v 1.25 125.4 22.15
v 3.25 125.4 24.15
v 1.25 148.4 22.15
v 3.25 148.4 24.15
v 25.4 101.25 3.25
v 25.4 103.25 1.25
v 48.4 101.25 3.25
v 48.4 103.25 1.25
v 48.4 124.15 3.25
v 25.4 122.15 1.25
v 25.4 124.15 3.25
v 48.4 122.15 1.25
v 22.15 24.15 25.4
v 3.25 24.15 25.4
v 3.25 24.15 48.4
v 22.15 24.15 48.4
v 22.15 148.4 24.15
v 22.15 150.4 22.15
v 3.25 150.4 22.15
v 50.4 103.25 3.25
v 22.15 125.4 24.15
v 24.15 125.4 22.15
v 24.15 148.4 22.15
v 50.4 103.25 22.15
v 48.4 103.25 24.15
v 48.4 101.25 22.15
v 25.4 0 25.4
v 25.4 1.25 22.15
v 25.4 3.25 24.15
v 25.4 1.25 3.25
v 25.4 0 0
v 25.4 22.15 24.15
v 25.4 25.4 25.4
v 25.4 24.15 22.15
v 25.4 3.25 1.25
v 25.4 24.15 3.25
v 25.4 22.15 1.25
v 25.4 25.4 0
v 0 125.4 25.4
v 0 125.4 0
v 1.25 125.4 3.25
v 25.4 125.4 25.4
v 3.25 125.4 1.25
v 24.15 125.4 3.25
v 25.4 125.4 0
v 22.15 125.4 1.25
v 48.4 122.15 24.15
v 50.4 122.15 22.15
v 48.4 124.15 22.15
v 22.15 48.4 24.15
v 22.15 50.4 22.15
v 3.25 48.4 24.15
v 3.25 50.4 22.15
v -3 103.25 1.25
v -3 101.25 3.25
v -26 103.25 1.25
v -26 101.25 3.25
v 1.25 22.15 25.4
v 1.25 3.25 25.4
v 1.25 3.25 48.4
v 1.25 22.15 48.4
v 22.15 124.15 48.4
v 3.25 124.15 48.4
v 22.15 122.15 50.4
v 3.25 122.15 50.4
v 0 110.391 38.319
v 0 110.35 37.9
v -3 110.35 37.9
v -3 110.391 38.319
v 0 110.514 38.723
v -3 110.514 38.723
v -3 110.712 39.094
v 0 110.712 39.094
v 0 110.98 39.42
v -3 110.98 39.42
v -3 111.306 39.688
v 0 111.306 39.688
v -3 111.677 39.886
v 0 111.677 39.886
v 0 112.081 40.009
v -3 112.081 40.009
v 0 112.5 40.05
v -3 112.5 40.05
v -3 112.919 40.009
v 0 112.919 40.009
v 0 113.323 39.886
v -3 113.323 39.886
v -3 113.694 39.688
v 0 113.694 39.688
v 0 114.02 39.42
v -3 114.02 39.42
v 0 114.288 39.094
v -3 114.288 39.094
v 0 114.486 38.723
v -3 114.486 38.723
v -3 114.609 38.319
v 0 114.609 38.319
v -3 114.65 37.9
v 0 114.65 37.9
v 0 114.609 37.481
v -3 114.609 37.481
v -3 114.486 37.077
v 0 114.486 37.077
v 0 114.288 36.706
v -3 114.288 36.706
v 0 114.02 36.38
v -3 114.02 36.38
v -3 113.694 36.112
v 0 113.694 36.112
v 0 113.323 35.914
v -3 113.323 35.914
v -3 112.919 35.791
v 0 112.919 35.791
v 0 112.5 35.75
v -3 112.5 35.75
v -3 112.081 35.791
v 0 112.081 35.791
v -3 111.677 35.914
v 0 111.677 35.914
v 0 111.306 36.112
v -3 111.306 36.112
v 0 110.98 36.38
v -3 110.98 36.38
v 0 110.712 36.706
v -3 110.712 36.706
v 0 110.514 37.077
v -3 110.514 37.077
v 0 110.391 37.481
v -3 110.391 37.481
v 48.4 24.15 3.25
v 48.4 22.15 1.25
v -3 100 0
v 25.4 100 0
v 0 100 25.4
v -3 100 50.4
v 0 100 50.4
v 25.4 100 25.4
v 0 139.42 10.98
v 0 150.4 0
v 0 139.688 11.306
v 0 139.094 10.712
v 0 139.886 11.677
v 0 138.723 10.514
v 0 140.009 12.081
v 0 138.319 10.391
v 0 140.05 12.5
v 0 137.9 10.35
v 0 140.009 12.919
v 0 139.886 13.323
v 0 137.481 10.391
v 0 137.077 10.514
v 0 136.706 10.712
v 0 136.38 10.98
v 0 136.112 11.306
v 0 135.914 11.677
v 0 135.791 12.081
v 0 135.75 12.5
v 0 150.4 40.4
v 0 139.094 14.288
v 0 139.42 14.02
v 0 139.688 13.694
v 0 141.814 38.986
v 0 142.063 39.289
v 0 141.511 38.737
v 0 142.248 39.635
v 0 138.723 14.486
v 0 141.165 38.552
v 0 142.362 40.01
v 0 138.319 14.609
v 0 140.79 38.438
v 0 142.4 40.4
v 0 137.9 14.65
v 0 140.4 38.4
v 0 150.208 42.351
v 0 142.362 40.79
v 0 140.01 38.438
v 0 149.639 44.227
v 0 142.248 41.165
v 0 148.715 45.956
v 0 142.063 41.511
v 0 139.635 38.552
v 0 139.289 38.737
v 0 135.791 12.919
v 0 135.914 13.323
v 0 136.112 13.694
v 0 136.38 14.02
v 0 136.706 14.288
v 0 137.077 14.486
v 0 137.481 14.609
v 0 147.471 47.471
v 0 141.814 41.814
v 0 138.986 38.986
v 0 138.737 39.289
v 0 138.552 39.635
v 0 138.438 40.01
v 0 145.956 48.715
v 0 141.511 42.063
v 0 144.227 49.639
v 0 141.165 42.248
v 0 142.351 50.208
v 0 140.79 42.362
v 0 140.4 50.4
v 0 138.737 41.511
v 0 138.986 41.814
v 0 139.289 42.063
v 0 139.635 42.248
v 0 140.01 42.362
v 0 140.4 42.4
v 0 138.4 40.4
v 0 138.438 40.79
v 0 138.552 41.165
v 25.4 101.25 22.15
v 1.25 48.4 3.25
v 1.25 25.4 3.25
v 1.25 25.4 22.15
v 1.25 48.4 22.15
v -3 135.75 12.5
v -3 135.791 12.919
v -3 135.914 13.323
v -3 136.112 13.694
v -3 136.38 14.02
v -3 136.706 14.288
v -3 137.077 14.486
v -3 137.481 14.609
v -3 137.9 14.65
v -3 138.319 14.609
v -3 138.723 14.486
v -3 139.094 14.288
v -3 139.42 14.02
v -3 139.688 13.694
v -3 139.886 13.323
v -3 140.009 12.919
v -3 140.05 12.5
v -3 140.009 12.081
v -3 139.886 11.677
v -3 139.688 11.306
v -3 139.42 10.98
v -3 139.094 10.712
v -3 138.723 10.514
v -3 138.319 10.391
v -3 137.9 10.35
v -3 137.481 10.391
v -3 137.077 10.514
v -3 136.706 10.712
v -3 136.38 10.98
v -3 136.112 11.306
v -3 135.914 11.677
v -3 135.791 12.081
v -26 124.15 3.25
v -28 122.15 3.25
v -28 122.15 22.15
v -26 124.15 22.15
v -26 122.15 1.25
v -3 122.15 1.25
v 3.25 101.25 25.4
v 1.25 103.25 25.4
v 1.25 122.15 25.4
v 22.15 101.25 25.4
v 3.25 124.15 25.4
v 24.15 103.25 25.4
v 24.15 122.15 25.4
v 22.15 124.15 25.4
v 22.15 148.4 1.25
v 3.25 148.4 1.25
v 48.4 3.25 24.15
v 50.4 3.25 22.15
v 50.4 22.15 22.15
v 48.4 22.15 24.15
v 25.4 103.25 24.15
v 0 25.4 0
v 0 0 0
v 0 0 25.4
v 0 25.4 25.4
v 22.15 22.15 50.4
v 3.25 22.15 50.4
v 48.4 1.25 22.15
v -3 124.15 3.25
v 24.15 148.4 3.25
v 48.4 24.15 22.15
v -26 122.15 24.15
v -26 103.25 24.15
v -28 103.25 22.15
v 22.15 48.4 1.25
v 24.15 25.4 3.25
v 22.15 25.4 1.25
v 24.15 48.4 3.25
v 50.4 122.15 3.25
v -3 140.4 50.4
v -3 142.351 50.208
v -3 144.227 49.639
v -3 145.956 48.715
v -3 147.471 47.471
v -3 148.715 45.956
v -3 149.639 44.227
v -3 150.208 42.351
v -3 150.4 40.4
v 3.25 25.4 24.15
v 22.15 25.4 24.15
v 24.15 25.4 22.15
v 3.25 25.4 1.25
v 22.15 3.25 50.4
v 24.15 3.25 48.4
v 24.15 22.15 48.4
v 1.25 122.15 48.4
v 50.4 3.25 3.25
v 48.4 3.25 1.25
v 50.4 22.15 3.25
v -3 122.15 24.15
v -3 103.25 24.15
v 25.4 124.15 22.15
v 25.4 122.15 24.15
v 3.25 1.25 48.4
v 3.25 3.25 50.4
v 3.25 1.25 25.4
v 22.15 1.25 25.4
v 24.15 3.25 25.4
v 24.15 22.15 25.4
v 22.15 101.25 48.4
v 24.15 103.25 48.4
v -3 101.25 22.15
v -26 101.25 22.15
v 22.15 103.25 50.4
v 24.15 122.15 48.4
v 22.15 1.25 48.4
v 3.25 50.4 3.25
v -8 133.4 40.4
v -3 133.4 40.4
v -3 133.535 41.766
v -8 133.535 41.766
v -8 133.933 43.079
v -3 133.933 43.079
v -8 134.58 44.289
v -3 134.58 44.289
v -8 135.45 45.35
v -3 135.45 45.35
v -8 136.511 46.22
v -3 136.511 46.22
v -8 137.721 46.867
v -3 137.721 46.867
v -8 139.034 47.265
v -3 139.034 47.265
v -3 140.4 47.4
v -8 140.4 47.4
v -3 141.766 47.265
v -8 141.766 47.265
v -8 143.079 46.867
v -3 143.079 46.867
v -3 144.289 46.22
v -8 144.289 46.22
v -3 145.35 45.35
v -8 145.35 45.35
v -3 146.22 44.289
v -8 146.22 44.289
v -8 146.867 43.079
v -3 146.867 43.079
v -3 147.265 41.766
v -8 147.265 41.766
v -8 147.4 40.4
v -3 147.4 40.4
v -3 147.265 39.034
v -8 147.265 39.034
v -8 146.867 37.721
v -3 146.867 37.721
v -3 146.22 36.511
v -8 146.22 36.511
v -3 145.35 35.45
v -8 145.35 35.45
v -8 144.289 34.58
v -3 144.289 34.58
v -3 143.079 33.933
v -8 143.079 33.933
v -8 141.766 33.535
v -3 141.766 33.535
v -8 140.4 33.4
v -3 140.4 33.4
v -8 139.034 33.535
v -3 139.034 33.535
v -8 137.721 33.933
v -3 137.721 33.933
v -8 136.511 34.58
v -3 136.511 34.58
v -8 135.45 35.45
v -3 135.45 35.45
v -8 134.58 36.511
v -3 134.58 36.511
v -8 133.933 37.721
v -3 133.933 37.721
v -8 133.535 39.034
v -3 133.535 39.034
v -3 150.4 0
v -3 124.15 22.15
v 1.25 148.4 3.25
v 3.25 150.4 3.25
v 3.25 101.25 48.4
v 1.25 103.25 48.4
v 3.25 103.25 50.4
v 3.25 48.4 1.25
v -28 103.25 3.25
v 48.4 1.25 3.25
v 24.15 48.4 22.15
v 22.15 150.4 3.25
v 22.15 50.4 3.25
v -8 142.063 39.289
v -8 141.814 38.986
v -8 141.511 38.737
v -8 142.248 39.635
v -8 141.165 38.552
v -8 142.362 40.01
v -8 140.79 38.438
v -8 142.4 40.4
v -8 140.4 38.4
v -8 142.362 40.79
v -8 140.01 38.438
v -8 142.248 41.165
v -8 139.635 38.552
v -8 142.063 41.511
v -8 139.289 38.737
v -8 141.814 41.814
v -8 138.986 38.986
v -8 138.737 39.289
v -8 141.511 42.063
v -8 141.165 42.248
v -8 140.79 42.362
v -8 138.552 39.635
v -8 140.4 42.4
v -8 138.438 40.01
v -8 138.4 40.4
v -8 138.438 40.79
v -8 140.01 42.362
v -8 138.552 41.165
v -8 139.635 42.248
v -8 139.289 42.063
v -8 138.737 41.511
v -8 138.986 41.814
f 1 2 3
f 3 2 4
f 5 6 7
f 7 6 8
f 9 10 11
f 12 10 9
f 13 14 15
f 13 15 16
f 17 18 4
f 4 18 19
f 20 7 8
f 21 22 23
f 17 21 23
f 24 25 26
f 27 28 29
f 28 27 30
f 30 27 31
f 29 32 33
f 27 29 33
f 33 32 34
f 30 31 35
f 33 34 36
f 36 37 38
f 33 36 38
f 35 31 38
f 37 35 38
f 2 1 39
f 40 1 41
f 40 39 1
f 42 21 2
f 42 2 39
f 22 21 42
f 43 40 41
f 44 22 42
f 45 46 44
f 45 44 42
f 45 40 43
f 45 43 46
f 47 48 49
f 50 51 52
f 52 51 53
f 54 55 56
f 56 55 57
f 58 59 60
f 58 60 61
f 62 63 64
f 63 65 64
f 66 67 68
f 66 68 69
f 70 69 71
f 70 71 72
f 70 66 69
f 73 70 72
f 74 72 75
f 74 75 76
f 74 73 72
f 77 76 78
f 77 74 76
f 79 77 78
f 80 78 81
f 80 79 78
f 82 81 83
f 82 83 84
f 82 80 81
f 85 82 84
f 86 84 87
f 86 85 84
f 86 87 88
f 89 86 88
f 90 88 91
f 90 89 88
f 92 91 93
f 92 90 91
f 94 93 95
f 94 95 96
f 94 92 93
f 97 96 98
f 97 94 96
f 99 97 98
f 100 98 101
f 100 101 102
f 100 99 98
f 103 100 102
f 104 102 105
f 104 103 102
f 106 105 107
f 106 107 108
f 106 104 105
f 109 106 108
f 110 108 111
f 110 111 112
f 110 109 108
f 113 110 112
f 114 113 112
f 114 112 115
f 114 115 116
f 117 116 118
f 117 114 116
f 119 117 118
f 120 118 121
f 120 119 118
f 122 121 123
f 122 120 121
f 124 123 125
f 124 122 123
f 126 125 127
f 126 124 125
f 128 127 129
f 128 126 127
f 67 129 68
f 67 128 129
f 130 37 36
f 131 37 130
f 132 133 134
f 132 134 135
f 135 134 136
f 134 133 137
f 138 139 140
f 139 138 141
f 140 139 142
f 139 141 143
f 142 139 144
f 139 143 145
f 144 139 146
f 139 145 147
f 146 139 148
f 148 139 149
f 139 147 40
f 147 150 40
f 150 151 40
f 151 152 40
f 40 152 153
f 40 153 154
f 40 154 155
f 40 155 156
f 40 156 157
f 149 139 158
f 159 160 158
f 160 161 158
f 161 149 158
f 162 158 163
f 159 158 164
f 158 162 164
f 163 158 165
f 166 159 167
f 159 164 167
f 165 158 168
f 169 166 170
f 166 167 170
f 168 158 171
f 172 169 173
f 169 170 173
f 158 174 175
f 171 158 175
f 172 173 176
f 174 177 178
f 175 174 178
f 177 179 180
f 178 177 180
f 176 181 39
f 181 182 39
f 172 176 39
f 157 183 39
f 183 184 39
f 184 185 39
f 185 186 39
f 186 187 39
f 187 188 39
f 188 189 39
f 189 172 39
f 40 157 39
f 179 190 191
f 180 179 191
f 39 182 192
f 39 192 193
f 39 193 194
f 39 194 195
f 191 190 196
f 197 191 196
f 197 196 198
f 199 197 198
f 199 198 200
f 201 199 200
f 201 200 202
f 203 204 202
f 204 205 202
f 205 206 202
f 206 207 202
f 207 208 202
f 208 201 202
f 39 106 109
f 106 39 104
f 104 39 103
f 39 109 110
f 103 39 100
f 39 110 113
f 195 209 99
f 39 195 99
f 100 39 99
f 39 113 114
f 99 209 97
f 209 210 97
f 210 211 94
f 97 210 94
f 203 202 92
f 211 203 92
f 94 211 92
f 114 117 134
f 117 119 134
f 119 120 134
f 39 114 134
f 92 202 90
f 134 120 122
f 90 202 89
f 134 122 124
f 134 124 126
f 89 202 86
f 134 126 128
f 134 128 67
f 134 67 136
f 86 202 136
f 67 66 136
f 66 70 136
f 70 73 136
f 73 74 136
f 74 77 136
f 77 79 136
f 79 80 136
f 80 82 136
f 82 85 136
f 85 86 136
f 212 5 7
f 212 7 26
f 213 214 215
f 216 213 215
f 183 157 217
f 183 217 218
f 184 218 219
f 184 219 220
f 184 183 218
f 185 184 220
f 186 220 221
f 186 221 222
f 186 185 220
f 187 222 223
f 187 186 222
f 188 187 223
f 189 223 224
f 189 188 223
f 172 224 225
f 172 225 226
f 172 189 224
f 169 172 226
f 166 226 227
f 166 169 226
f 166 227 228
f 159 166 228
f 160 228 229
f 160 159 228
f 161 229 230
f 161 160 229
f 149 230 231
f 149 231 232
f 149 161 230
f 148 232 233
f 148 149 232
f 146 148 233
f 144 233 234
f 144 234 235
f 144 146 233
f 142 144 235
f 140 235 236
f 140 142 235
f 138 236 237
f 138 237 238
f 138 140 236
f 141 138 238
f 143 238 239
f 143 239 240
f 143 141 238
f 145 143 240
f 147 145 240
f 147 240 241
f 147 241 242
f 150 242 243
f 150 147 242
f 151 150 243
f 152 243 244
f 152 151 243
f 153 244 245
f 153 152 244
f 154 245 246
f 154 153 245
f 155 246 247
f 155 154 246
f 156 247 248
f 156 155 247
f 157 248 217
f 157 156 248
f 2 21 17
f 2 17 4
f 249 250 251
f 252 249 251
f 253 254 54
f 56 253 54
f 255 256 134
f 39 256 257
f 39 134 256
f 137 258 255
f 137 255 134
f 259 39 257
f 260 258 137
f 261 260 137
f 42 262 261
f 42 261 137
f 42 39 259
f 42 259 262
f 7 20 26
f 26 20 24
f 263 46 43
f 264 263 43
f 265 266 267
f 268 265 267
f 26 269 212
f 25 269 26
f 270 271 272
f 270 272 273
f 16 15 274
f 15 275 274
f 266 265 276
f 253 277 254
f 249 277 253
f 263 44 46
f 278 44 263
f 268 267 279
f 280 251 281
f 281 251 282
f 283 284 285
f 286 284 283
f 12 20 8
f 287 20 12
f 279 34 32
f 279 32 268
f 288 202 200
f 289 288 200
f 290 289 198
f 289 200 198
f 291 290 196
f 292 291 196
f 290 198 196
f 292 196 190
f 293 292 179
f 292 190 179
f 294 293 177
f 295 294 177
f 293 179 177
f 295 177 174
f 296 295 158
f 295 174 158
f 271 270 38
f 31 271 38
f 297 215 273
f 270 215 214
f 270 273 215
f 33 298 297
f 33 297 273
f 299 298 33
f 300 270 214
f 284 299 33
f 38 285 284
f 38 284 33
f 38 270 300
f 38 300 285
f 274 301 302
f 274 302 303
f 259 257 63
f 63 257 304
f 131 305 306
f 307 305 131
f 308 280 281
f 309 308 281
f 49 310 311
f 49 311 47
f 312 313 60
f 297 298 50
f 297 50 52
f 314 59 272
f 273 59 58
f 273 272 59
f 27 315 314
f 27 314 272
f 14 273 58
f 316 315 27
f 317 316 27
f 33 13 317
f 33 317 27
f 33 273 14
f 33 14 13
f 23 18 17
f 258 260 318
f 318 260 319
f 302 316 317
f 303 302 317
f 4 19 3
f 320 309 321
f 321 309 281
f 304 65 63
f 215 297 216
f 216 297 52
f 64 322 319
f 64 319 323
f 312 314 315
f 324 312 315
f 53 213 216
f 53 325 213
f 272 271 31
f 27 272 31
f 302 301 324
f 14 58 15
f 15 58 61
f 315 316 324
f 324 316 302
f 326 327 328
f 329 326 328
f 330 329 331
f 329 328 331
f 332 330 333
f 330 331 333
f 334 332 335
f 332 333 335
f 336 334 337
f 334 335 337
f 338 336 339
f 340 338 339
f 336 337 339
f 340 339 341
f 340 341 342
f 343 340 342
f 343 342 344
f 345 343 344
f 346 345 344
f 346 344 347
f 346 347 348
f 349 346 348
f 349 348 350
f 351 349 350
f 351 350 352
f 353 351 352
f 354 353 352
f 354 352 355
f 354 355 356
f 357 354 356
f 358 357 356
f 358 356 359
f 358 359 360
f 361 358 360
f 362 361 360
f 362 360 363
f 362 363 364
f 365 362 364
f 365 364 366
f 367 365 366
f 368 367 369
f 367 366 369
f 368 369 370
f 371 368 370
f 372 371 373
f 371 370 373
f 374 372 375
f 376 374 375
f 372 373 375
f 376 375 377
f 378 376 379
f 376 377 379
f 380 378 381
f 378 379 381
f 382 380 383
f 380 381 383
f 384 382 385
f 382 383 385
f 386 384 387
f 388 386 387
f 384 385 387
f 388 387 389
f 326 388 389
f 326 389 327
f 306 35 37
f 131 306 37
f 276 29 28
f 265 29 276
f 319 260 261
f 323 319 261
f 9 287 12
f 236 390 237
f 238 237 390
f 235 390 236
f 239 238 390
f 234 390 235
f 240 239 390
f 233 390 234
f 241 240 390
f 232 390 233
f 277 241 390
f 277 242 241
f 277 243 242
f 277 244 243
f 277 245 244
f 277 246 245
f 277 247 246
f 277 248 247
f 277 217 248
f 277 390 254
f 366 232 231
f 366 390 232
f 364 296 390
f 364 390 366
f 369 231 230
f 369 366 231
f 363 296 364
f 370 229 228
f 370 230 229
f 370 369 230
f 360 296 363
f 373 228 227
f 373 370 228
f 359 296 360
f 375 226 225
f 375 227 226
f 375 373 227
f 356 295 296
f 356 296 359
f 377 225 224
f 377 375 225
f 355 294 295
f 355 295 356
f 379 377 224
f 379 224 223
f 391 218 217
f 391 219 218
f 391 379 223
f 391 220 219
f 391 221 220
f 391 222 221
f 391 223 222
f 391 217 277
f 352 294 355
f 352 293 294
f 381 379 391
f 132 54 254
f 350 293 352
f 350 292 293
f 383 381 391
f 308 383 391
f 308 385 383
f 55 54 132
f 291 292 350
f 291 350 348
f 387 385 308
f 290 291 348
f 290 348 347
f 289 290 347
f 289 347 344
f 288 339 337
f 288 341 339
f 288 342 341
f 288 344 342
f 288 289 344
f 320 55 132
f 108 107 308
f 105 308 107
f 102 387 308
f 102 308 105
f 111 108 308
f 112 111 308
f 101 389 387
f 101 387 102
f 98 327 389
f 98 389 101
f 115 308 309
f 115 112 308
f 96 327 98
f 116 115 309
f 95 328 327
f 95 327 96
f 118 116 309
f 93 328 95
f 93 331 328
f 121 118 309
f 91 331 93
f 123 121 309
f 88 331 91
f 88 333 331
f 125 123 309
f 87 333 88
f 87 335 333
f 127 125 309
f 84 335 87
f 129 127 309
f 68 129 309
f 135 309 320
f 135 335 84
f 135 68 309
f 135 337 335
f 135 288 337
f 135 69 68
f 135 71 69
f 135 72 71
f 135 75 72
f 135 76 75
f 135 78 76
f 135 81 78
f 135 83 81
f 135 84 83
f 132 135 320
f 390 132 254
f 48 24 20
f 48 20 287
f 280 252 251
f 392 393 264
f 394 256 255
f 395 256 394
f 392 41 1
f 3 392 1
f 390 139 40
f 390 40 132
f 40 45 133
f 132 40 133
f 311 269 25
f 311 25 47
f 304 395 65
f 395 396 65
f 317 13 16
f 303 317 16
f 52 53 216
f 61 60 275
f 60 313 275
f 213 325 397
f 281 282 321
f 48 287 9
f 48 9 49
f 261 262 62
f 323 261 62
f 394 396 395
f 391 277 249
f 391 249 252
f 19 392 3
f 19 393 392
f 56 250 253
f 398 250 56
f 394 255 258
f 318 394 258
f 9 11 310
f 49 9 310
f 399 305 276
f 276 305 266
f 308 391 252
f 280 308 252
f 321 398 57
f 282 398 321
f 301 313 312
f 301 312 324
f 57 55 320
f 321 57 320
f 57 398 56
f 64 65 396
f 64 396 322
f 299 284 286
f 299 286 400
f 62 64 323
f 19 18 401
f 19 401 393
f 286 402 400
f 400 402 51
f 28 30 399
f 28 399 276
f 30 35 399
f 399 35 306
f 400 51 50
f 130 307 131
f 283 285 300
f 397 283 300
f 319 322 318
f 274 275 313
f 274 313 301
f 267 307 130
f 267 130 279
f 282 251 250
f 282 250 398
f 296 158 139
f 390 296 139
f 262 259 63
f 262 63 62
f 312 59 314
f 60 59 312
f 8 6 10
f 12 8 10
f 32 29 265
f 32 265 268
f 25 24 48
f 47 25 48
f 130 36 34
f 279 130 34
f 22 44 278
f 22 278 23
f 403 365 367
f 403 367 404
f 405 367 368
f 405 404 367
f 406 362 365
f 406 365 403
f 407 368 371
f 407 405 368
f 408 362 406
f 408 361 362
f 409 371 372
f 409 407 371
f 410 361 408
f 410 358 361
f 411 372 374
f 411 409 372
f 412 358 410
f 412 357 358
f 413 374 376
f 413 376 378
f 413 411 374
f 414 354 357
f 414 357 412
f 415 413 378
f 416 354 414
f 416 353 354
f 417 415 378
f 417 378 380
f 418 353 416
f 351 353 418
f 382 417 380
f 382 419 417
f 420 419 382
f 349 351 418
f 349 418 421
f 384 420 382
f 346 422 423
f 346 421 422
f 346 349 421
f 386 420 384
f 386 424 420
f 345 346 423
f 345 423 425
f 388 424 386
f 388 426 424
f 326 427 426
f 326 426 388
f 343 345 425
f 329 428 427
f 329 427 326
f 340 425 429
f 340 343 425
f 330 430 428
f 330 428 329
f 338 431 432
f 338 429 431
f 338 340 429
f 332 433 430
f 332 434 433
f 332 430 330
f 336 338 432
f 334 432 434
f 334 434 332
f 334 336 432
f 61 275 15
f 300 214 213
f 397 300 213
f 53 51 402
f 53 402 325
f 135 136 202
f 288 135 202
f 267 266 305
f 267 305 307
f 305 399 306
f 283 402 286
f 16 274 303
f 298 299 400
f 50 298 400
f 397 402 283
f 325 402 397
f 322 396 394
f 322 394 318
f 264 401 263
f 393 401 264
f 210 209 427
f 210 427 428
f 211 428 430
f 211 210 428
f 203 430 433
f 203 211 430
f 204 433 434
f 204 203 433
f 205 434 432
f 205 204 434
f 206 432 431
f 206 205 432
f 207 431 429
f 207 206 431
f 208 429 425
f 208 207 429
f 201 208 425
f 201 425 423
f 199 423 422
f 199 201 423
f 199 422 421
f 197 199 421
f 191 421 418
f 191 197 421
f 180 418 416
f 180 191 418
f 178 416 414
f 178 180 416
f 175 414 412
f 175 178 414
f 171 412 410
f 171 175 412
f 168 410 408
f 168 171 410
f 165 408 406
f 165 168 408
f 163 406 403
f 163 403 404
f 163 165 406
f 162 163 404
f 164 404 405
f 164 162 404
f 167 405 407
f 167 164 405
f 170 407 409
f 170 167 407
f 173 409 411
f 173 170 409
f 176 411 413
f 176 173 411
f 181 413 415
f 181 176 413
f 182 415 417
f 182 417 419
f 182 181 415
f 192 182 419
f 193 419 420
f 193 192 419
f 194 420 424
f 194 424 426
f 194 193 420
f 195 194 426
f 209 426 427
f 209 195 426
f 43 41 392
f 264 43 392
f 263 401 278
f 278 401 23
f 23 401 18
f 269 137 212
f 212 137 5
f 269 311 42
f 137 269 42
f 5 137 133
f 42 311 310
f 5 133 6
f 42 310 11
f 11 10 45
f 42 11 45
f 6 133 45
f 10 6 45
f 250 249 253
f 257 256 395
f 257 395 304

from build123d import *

# Parameters (mm, degrees)
F0_W      = 25.4
F0_H      = 25.4
F1_DEPTH  = 25.4
F2_W      = 22.9
F2_H      = 22.9
F3_DEPTH  = 25
F4_W      = 22.9
F4_H      = 22.9
F5_DEPTH  = 25
F6_W      = 22.9
F6_H      = 22.9
F7_DEPTH  = 25
F8_SIZE   = 2
F12_W     = 25.4
F12_H     = 25.4
F12_R     = 2.15
F12_R_2   = 7
F13_DEPTH = 3
F12_R_3   = 2
F14_DEPTH = 8
F15_W     = 22.9
F15_H     = 22.9
F16_DEPTH = 25
F17_SIZE  = 2


with BuildPart() as f1:
    # F0 (on Top) → F1 (new body)
    with BuildSketch(Plane.XY):
        with Locations((12.7, 12.7)):
            Rectangle(F0_W, F0_H)
    extrude(amount=F1_DEPTH)

    # F2 (on face) → F3 (join)
    with BuildSketch(Plane.XY.offset(25.4)):
        with Locations((12.7, 12.7)):
            Rectangle(F2_W, F2_H)
    extrude(amount=F3_DEPTH)

    # F4 (on face) → F5 (join)
    with BuildSketch(Plane.YZ.offset(25.4)):
        with Locations((12.7, 12.7)):
            Rectangle(F4_W, F4_H)
    extrude(amount=F5_DEPTH)

    # F6 (on face) → F7 (join)
    with BuildSketch(Plane(origin=(0, 25.4, 0), x_dir=(-1, 0, 0), z_dir=(0, 1, 0))):
        with Locations((-12.7, 12.7)):
            Rectangle(F6_W, F6_H)
    extrude(amount=F7_DEPTH)

    # F8
    f8_edges = [f1.edges().sort_by_distance(p)[0] for p in [
        (12.7, 24.15, 50.4),
        (1.25, 12.7, 50.4),
        (12.7, 1.25, 50.4),
        (24.15, 12.7, 50.4),
        (1.25, 1.25, 37.9),
        (24.15, 1.25, 37.9),
        (1.25, 24.15, 37.9),
        (24.15, 24.15, 37.9),
        (37.9, 1.25, 1.25),
        (37.9, 1.25, 24.15),
        (50.4, 12.7, 24.15),
        (50.4, 1.25, 12.7),
        (50.4, 12.7, 1.25),
        (50.4, 24.15, 12.7),
        (37.9, 24.15, 1.25),
        (37.9, 24.15, 24.15),
        (1.25, 50.4, 12.7),
        (12.7, 50.4, 24.15),
        (24.15, 50.4, 12.7),
        (12.7, 50.4, 1.25),
        (24.15, 37.9, 24.15),
        (1.25, 37.9, 24.15),
        (24.15, 37.9, 1.25),
        (1.25, 37.9, 1.25),
    ]]
    chamfer(f8_edges, length=F8_SIZE)


with BuildPart() as f9_1:
    # F9: copy of F1
    add(f1.part.moved(Location((150, 0, 0))))


with BuildPart() as f11_1:
    # F11: copy of F1
    add(f1.part.moved(Location((0, 100, 0))))

    # F12 (on face) → F13 (join)
    with BuildSketch(Plane(origin=(0, 0, 0), x_dir=(0, -1, 0), z_dir=(-1, 0, 0))):
        with Locations((-112.7, 12.7)):
            Rectangle(F12_W, F12_H)
        with BuildLine():
            Line((-150.4, 0), (-125.4, 0))
            Line((-125.4, 0), (-125.4, 25.4))
            Line((-125.4, 25.4), (-100, 25.4))
            Line((-100, 25.4), (-100, 50.4))
            Line((-100, 50.4), (-140.4, 50.4))
            ThreePointArc((-140.4, 50.4), (-147.4710678119, 47.4710678119), (-150.4, 40.4))
            Line((-150.4, 40.4), (-150.4, 0))
        make_face()
        with Locations((-137.9, 12.5)):
            Circle(F12_R, mode=Mode.SUBTRACT)
        with Locations((-140.4, 40.4)):
            Circle(F12_R_2, mode=Mode.SUBTRACT)
        with Locations((-112.5, 37.9)):
            Circle(F12_R, mode=Mode.SUBTRACT)
    extrude(amount=F13_DEPTH)

    # F12 (on face) → F14 (join)
    with BuildSketch(Plane(origin=(0, 0, 0), x_dir=(0, -1, 0), z_dir=(-1, 0, 0))):
        with Locations((-140.4, 40.4)):
            Circle(F12_R_2)
        with Locations((-140.4, 40.4)):
            Circle(F12_R_3, mode=Mode.SUBTRACT)
    extrude(amount=F14_DEPTH)

    # F15 (on face) → F16 (join)
    with BuildSketch(Plane(origin=(-3, 0, 0), x_dir=(0, -1, 0), z_dir=(-1, 0, 0))):
        with Locations((-112.7, 12.7)):
            Rectangle(F15_W, F15_H)
    extrude(amount=F16_DEPTH)

    # F17
    f17_edges = [f11_1.edges().sort_by_distance(p)[0] for p in [
        (-15.5, 124.15, 24.15),
        (-15.5, 124.15, 1.25),
        (-28, 124.15, 12.7),
        (-28, 101.25, 12.7),
        (-28, 112.7, 24.15),
        (-28, 112.7, 1.25),
        (-15.5, 101.25, 24.15),
        (-15.5, 101.25, 1.25),
    ]]
    chamfer(f17_edges, length=F17_SIZE)


solid = Compound([f1.part, f11_1.part])
